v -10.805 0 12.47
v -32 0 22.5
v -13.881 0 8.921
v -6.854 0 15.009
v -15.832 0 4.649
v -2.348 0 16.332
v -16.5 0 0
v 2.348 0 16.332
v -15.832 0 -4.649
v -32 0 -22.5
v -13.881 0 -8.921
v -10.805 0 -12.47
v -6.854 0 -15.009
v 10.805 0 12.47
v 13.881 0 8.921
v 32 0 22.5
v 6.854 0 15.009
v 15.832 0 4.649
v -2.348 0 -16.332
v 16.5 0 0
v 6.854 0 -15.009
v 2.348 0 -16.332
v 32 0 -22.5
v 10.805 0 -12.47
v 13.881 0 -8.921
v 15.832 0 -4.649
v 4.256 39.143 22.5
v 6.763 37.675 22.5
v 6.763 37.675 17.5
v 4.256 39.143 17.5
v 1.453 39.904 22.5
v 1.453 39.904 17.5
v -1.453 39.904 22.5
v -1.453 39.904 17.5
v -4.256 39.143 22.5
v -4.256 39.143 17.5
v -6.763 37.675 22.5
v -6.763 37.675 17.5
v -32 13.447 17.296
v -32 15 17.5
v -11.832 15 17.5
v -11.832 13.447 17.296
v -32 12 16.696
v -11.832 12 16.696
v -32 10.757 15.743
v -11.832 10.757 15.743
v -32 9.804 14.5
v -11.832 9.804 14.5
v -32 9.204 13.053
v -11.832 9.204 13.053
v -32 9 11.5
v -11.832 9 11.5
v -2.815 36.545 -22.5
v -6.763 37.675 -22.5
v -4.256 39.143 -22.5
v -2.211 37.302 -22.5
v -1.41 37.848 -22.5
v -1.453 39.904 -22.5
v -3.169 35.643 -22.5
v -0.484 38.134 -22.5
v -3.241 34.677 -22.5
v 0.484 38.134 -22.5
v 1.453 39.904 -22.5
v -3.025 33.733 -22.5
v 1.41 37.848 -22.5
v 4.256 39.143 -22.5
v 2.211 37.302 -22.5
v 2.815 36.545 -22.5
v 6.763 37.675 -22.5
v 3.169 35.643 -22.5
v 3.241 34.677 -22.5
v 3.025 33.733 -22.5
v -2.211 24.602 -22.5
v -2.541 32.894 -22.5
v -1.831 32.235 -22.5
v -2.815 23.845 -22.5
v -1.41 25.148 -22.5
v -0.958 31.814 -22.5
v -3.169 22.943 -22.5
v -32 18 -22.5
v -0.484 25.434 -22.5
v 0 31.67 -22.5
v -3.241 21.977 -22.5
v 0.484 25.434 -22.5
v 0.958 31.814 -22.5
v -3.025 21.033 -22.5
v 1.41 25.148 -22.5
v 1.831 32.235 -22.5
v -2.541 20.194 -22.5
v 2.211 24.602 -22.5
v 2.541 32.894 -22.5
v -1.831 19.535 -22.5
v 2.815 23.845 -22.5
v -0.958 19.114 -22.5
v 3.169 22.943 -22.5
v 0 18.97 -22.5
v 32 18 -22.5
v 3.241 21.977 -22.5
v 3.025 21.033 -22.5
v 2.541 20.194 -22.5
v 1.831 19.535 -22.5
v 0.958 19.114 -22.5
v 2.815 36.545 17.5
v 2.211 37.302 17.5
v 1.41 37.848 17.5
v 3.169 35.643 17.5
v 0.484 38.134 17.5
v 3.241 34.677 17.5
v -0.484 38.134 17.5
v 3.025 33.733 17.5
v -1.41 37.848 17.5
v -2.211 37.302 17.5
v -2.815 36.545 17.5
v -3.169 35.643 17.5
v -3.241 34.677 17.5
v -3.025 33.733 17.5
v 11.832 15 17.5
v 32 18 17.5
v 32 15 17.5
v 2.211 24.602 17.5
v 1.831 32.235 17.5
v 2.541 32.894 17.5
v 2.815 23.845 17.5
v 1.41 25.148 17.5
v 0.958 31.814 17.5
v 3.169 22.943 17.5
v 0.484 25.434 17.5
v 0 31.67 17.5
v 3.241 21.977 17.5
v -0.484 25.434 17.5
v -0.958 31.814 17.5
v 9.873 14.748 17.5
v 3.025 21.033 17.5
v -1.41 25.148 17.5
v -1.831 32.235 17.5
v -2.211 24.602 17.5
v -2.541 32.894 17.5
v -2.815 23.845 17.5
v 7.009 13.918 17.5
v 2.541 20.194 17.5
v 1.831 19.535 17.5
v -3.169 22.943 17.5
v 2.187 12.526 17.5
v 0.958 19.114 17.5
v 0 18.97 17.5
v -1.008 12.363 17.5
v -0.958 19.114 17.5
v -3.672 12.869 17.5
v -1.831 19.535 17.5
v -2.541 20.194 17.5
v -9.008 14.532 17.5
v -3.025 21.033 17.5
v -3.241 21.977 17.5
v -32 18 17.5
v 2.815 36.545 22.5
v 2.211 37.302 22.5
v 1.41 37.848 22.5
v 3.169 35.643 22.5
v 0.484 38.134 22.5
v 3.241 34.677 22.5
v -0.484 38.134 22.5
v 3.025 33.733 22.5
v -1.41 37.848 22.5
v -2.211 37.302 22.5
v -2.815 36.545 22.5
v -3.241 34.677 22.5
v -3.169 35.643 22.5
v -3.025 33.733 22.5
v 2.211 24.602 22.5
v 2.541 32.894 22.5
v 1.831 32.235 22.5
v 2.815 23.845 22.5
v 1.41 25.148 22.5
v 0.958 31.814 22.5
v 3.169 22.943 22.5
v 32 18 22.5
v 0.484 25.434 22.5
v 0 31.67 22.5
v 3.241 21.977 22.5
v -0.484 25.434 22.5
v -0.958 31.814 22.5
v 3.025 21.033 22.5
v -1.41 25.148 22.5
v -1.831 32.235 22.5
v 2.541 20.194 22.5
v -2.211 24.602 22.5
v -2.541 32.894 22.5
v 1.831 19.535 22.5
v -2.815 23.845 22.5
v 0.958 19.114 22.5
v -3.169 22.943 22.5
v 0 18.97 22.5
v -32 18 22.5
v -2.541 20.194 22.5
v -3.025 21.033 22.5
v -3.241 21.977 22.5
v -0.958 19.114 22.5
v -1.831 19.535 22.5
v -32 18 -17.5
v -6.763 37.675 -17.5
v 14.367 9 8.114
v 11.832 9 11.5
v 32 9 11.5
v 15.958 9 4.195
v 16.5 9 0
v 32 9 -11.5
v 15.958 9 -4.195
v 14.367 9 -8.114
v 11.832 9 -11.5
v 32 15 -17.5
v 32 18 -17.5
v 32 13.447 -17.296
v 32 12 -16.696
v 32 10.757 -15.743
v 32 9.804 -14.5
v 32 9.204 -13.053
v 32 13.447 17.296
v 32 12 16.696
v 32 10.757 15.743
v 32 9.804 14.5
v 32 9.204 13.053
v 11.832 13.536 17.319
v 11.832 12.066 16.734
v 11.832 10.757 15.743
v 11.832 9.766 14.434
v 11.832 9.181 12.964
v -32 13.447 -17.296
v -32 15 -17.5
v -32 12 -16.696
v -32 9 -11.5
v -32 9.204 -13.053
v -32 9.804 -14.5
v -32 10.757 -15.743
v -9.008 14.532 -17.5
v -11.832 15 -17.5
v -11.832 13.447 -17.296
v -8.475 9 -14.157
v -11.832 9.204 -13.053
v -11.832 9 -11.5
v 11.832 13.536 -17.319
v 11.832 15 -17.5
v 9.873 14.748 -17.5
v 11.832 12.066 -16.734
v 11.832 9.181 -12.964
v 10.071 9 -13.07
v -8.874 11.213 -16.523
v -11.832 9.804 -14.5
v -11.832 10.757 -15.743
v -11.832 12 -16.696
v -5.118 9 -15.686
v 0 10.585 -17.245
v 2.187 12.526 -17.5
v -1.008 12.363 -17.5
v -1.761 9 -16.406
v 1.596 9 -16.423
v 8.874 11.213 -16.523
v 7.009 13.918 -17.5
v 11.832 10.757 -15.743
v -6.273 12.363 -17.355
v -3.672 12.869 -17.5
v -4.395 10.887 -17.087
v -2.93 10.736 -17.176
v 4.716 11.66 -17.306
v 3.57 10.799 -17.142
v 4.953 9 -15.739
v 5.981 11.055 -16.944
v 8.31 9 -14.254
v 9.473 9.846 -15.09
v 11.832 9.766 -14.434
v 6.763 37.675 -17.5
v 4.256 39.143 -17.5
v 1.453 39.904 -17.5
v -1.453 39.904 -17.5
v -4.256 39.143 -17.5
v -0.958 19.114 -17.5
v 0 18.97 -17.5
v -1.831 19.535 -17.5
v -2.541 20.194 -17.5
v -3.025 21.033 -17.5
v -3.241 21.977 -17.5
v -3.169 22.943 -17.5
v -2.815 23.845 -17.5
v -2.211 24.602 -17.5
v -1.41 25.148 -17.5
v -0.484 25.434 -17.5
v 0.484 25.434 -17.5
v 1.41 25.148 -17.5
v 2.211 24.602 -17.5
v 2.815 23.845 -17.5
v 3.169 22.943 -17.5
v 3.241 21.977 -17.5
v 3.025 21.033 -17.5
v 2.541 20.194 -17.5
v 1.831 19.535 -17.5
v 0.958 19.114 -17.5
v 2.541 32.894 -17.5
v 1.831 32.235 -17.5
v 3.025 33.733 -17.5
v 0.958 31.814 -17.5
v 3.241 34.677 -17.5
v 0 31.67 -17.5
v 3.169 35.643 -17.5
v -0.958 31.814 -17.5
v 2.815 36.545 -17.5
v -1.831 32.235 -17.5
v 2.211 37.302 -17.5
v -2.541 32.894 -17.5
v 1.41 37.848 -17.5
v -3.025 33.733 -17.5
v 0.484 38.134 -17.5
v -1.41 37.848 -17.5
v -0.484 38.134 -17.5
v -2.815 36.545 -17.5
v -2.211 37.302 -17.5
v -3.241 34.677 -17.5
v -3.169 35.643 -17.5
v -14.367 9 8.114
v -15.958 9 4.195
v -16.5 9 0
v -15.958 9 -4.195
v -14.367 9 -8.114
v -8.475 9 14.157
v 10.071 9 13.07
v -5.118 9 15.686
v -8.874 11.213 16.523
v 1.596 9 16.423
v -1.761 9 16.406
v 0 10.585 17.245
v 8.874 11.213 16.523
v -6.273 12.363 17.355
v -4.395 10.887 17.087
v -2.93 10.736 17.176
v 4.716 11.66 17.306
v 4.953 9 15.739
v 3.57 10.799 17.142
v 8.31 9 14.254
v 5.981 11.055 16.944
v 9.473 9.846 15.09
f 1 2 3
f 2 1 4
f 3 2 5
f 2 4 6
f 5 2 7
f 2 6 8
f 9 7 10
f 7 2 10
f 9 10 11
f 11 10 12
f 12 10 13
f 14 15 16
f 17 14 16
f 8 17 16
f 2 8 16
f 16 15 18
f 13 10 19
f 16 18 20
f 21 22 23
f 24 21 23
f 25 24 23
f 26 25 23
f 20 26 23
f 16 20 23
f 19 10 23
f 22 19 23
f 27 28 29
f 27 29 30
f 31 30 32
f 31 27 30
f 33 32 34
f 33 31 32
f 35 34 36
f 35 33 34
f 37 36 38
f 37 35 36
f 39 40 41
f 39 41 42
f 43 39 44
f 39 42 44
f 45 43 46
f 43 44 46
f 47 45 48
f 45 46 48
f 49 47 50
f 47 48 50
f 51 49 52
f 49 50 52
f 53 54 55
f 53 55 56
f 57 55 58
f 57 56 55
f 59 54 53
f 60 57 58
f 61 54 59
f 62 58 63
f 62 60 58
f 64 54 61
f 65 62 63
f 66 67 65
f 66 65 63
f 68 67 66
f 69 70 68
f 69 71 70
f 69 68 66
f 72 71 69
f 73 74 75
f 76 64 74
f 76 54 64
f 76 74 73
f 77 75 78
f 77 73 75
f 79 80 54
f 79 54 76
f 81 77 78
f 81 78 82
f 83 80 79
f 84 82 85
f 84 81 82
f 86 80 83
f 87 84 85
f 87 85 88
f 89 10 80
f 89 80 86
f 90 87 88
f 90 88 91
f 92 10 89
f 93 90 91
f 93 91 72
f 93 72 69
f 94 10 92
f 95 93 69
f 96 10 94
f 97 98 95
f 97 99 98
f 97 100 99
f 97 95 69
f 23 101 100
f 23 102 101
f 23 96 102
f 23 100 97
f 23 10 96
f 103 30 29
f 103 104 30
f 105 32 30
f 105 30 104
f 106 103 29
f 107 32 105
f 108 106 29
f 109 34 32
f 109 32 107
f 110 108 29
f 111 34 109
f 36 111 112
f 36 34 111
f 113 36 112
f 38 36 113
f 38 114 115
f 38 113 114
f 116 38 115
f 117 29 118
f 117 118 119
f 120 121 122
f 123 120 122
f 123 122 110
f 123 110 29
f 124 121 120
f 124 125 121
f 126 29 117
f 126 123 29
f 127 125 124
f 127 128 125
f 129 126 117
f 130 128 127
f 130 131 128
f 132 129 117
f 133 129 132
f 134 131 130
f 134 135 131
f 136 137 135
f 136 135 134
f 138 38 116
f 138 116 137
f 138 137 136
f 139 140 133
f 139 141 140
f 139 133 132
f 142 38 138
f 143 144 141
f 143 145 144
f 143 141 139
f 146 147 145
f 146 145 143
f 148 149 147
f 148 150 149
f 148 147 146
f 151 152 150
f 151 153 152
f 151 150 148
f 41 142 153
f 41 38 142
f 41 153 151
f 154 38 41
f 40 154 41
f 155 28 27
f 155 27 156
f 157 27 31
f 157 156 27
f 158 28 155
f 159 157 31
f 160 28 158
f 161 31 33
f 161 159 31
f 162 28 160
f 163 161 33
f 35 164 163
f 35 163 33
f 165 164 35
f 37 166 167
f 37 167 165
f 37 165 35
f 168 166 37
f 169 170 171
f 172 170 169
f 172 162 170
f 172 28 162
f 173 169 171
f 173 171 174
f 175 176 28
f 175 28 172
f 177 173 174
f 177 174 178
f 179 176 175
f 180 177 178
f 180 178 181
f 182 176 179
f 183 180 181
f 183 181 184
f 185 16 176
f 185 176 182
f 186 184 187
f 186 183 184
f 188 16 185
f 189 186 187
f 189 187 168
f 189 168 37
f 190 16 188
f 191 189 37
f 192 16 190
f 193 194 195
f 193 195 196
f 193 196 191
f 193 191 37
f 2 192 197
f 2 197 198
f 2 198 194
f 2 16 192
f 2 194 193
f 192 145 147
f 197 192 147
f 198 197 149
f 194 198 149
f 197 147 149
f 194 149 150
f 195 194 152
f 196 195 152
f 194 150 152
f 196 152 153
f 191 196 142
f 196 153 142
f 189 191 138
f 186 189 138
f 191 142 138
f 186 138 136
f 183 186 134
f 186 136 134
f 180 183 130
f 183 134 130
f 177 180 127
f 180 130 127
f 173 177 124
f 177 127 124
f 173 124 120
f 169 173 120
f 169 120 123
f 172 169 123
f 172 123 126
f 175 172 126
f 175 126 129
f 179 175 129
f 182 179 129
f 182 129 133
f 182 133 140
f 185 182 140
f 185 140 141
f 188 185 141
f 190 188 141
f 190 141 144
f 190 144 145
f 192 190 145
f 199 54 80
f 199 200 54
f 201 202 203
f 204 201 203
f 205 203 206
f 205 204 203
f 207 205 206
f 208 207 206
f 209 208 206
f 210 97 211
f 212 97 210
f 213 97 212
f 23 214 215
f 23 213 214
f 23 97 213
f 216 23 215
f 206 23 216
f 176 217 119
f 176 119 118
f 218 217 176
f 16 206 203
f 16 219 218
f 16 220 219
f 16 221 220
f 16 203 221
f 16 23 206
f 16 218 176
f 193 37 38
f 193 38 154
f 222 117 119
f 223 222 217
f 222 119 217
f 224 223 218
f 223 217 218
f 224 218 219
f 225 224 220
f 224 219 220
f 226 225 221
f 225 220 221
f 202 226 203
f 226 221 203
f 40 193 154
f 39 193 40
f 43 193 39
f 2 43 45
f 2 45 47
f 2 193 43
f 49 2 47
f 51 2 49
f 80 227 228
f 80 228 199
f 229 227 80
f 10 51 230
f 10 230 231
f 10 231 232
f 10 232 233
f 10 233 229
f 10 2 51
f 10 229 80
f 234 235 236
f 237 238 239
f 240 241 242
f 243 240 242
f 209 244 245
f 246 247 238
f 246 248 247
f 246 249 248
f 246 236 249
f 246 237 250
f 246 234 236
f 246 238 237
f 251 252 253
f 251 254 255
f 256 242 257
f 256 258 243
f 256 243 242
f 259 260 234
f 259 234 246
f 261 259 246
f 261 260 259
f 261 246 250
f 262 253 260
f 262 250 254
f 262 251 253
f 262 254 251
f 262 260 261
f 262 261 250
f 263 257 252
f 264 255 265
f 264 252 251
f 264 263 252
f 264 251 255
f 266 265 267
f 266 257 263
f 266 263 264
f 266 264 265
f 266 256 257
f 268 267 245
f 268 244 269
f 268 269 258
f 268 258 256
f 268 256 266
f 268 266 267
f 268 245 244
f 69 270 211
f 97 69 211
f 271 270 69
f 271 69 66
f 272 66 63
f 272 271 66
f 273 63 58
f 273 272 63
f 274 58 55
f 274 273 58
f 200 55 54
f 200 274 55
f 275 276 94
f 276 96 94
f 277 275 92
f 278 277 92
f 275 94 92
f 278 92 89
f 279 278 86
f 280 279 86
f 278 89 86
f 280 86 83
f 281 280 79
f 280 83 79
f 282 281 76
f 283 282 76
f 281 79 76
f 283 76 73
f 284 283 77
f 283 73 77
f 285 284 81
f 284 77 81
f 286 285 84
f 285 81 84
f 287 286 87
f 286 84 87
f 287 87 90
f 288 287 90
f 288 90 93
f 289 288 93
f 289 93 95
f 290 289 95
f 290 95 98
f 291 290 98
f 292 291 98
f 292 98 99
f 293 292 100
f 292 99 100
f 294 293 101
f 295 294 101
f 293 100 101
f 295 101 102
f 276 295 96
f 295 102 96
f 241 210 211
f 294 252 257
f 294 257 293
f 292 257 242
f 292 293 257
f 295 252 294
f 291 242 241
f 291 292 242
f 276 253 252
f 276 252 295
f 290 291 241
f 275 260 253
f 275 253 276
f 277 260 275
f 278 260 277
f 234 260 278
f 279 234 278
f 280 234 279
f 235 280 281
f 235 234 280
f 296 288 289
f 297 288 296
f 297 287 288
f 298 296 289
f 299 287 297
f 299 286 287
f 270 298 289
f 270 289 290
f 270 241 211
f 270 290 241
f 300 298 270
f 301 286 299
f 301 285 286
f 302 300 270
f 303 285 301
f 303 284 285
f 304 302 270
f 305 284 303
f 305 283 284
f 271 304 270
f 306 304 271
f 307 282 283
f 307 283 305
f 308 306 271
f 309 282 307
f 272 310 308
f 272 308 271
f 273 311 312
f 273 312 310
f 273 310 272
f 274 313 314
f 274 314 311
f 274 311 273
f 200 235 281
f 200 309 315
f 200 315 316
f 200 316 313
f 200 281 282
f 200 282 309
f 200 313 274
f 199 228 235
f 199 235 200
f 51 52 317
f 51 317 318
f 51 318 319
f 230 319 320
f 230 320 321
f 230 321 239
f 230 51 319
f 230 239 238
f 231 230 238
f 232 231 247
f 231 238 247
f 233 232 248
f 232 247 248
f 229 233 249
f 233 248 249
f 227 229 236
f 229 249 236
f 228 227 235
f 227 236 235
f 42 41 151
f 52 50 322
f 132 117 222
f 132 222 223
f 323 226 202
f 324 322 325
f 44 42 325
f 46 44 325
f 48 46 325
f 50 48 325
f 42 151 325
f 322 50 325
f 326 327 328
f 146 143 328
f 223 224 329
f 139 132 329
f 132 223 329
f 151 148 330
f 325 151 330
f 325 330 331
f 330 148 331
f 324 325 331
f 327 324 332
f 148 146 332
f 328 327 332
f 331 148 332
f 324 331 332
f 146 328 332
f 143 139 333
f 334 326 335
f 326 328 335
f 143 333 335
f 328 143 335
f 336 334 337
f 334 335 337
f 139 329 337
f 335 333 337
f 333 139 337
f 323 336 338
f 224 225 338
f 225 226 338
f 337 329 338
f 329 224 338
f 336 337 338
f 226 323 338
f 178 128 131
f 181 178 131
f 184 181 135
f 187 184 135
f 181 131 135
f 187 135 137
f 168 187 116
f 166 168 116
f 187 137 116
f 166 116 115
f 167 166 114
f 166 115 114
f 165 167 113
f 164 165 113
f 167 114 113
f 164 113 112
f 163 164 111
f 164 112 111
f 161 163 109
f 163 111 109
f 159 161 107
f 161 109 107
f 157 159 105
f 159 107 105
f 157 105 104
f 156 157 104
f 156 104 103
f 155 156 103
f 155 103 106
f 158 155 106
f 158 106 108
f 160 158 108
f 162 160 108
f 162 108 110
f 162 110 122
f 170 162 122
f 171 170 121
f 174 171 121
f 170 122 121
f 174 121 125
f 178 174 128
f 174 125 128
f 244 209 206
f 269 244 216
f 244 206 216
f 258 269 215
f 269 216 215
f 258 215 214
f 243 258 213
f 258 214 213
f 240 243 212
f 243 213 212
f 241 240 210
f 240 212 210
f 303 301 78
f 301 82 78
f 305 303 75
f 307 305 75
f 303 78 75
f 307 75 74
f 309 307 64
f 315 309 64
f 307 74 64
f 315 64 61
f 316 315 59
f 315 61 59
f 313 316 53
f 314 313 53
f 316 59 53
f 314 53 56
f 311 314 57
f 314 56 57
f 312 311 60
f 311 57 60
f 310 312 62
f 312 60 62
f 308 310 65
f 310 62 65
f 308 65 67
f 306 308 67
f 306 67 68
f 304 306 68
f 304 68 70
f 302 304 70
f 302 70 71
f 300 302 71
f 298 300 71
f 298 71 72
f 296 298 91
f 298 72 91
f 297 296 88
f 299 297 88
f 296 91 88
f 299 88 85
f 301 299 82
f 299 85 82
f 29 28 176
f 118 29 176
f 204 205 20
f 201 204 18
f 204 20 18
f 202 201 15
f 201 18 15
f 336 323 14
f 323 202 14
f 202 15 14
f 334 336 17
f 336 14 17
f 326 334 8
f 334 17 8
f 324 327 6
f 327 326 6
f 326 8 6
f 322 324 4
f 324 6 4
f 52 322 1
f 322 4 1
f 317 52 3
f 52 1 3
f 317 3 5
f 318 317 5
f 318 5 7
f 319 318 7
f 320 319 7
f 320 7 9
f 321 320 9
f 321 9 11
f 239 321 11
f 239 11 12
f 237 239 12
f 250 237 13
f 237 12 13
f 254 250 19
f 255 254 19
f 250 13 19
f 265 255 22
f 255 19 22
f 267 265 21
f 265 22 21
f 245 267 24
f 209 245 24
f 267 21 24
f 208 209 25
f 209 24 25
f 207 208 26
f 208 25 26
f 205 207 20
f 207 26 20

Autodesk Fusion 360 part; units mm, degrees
sketch "Sketch1" plane through (0, 0, 0) normal (0, 1, 0) x (1, 0, 0)
  line L0 (32, -22.5) -> (-32, -22.5)
  line L1 (-32, -22.5) -> (-32, 22.5)
  line L2 (-32, 22.5) -> (32, 22.5)
  line L3 (32, 22.5) -> (32, -22.5)
  line L4 (32, -22.5) -> (-32, 22.5) construction
  line L5 (-32, -22.5) -> (32, 22.5) construction
  dimension "d1" = 64
  dimension "d6" = 45
extrude "Extrude1" add sketch "Sketch1" along normal blind 40
sketch "Sketch2" plane through (0, 0, 22.5) normal (0, 0, 1) x (-1, 0, 0)
  line L0 (32, 0) -> (-32, 0)
  line L1 (-32, 0) -> (-32, -40)
  line L2 (-32, -40) -> (32, -40)
  line L3 (32, -40) -> (32, 0)
  circle A0 centre (0, -29) radius 11
  line L4 (32, -16) -> (18.8835, -16)
  line L5 (18.8835, -16) -> (-32, -16)
  line L6 (6.7633, -37.6751) -> (32, -18)
  line L7 (-6.7633, -37.6751) -> (-32, -18)
  line L8 (0, 0) -> (0, -40) construction
  line L9 (32, -18) -> (-32, -18)
  dimension "d4" = 22
  dimension "d5" = 24
  dimension "d7" = 22
extrude "Extrude2" cut sketch "Sketch2" against normal blind 45 contours L2 L3 A0 L6 | L1 L2 A0 L7
sketch "Sketch3" plane through (-32, 0, 0) normal (-1, 0, 0) x (0, -1, 0)
  line L0 (-18, 22.5) -> (-18, -22.5)
  line L1 (-18, -22.5) -> (0, -22.5)
  line L2 (0, -22.5) -> (0, 22.5)
  line L3 (0, 22.5) -> (-18, 22.5)
  line L4 (0, 0) -> (-40.0524, 0)
  line L5 (-40, 22.5) -> (-40, -22.5)
  line L6 (-40, -22.5) -> (-37.6751, -22.5)
  line L7 (-37.6751, 22.5) -> (-40, 22.5)
  line L8 (-40, 17.5) -> (-9, 17.5)
  line L9 (-9, 17.5) -> (-9, -17.5)
  line L10 (-9, -17.5) -> (-40, -17.5)
  line L11 (-40, -17.5) -> (-40, 17.5)
  line L12 (-40, 17.5) -> (-9, -17.5) construction
  line L13 (-9, 17.5) -> (-40, -17.5) construction
  point P0 (-24.5, 0)
  dimension "d10" = 35
  dimension "d11" = 31
extrude "Extrude3" cut sketch "Sketch3" against normal blind 64 contours L0 L4 L8 L9 | L0 L4 L5 L8 L11 | L0 L4 L9 L10 | L0 L4 L5 L10 L11
sketch "Sketch4" plane through (0, 0, 22.5) normal (0, 0, 1) x (-1, 0, 0)
  line L0 (6.7633, -37.6751) -> (32, -18)
  line L1 (32, -18) -> (32, 0)
  line L2 (32, 0) -> (-32, 0)
  line L3 (-32, 0) -> (-32, -18)
  line L4 (-32, -18) -> (-6.7633, -37.6751)
  arc A0 (-6.7633, -37.6751) -> (6.7633, -37.6751) centre (0, -29) ccw
  circle A1 centre (0, -29) radius 11
  circle A2 centre (0, -29) radius 3.175
  line L5 (0, -40) -> (0, 0)
  point P0 (0, -34.92)
  point P1 (0, -22.22)
  dimension "d14" = 22
  dimension "d15" = 6.35
  dimension "d18" = 12.7
  dimension "d19" = 5.08
hole "Hole1" at (0, 22.22, 22.5) at (0, 34.92, 22.5) direction (0, 0, -1) diameter 6.5 depth 49 tip angle 180
sketch "Sketch5" plane through (0, 0, 0) normal (0, -1, 0) x (1, 0, 0)
  line L0 (-32, -22.5) -> (32, -22.5)
  line L1 (32, -22.5) -> (32, 22.5)
  line L2 (32, 22.5) -> (-32, 22.5)
  line L3 (-32, 22.5) -> (-32, -22.5)
  circle A0 centre (0, 0) radius 16.5
  dimension "d23" = 33
extrude "Extrude5" cut sketch "Sketch5" against normal blind 9 contours A0
fillet "Fillet1" radius 6 2 edges at (0, 9, -17.5) (0, 9, 17.5)
